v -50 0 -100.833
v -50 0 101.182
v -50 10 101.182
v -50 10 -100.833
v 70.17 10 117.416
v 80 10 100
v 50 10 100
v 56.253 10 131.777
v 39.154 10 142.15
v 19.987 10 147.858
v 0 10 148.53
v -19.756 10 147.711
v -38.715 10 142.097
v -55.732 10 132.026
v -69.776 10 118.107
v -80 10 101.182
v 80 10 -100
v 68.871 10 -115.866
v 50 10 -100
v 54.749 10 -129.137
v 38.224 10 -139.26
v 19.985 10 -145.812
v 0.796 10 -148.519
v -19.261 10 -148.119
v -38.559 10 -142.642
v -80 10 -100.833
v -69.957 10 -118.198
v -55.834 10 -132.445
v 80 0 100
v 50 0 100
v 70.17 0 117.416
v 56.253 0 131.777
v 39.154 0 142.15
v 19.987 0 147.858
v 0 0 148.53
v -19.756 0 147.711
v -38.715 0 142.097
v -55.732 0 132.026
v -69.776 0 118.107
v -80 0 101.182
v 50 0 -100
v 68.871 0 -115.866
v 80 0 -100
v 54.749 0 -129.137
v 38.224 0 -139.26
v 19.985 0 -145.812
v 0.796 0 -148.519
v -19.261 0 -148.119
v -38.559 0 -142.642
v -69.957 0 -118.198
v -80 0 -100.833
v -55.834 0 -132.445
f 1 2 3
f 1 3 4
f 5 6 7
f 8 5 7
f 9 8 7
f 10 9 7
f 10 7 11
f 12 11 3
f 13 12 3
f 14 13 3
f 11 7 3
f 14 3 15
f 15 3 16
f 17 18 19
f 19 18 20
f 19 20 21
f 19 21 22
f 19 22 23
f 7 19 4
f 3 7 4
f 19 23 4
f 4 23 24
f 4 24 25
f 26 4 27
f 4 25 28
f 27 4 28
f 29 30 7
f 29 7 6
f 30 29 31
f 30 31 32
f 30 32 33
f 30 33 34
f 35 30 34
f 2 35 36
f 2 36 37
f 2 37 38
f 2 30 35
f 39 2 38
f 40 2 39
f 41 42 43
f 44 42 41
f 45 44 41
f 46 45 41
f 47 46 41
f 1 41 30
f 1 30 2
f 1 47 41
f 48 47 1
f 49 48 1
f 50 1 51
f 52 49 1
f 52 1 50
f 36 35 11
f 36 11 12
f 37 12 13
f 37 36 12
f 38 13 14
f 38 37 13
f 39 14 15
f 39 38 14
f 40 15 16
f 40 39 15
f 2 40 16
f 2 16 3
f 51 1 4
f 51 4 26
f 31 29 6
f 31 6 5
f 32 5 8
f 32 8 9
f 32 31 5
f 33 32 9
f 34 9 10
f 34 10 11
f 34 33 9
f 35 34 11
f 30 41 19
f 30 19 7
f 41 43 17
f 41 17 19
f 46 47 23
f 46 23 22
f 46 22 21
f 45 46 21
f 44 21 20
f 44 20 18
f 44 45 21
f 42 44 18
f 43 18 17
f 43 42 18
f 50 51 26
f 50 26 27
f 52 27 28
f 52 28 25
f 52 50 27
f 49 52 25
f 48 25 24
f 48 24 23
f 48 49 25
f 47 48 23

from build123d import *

# Parameters (mm, degrees)
BOSS_EXTRUDE2_DEPTH = 10


with BuildPart() as part:
    # Sketch1 → Boss-Extrude2 (new body)
    with BuildSketch(Plane(origin=(0, 0, 0), x_dir=(1, 0, 0), z_dir=(0, 1, 0))):
        with BuildLine():
            Line((50, 100), (50, -100))
            Line((50, -100), (80, -100))
            ThreePointArc((80, -100), (48.035495612, -137.511232206), (0, -148.53))
            ThreePointArc((0, -148.53), (-47.534227524, -137.586137939), (-80, -101.182229899))
            Line((-80, -101.182229899), (-50, -101.182229899))
            Line((-50, -101.182229899), (-50, 100.833366542))
            Line((-50, 100.833366542), (-80, 100.833366542))
            ThreePointArc((-80, 100.833366542), (-47.524044038, 138.098471025), (0.795654444, 148.518762113))
            ThreePointArc((0.795654444, 148.518762113), (46.745634315, 134.621844661), (80, 100))
            Line((80, 100), (50, 100))
        make_face()
    extrude(amount=BOSS_EXTRUDE2_DEPTH)


solid = part.part
